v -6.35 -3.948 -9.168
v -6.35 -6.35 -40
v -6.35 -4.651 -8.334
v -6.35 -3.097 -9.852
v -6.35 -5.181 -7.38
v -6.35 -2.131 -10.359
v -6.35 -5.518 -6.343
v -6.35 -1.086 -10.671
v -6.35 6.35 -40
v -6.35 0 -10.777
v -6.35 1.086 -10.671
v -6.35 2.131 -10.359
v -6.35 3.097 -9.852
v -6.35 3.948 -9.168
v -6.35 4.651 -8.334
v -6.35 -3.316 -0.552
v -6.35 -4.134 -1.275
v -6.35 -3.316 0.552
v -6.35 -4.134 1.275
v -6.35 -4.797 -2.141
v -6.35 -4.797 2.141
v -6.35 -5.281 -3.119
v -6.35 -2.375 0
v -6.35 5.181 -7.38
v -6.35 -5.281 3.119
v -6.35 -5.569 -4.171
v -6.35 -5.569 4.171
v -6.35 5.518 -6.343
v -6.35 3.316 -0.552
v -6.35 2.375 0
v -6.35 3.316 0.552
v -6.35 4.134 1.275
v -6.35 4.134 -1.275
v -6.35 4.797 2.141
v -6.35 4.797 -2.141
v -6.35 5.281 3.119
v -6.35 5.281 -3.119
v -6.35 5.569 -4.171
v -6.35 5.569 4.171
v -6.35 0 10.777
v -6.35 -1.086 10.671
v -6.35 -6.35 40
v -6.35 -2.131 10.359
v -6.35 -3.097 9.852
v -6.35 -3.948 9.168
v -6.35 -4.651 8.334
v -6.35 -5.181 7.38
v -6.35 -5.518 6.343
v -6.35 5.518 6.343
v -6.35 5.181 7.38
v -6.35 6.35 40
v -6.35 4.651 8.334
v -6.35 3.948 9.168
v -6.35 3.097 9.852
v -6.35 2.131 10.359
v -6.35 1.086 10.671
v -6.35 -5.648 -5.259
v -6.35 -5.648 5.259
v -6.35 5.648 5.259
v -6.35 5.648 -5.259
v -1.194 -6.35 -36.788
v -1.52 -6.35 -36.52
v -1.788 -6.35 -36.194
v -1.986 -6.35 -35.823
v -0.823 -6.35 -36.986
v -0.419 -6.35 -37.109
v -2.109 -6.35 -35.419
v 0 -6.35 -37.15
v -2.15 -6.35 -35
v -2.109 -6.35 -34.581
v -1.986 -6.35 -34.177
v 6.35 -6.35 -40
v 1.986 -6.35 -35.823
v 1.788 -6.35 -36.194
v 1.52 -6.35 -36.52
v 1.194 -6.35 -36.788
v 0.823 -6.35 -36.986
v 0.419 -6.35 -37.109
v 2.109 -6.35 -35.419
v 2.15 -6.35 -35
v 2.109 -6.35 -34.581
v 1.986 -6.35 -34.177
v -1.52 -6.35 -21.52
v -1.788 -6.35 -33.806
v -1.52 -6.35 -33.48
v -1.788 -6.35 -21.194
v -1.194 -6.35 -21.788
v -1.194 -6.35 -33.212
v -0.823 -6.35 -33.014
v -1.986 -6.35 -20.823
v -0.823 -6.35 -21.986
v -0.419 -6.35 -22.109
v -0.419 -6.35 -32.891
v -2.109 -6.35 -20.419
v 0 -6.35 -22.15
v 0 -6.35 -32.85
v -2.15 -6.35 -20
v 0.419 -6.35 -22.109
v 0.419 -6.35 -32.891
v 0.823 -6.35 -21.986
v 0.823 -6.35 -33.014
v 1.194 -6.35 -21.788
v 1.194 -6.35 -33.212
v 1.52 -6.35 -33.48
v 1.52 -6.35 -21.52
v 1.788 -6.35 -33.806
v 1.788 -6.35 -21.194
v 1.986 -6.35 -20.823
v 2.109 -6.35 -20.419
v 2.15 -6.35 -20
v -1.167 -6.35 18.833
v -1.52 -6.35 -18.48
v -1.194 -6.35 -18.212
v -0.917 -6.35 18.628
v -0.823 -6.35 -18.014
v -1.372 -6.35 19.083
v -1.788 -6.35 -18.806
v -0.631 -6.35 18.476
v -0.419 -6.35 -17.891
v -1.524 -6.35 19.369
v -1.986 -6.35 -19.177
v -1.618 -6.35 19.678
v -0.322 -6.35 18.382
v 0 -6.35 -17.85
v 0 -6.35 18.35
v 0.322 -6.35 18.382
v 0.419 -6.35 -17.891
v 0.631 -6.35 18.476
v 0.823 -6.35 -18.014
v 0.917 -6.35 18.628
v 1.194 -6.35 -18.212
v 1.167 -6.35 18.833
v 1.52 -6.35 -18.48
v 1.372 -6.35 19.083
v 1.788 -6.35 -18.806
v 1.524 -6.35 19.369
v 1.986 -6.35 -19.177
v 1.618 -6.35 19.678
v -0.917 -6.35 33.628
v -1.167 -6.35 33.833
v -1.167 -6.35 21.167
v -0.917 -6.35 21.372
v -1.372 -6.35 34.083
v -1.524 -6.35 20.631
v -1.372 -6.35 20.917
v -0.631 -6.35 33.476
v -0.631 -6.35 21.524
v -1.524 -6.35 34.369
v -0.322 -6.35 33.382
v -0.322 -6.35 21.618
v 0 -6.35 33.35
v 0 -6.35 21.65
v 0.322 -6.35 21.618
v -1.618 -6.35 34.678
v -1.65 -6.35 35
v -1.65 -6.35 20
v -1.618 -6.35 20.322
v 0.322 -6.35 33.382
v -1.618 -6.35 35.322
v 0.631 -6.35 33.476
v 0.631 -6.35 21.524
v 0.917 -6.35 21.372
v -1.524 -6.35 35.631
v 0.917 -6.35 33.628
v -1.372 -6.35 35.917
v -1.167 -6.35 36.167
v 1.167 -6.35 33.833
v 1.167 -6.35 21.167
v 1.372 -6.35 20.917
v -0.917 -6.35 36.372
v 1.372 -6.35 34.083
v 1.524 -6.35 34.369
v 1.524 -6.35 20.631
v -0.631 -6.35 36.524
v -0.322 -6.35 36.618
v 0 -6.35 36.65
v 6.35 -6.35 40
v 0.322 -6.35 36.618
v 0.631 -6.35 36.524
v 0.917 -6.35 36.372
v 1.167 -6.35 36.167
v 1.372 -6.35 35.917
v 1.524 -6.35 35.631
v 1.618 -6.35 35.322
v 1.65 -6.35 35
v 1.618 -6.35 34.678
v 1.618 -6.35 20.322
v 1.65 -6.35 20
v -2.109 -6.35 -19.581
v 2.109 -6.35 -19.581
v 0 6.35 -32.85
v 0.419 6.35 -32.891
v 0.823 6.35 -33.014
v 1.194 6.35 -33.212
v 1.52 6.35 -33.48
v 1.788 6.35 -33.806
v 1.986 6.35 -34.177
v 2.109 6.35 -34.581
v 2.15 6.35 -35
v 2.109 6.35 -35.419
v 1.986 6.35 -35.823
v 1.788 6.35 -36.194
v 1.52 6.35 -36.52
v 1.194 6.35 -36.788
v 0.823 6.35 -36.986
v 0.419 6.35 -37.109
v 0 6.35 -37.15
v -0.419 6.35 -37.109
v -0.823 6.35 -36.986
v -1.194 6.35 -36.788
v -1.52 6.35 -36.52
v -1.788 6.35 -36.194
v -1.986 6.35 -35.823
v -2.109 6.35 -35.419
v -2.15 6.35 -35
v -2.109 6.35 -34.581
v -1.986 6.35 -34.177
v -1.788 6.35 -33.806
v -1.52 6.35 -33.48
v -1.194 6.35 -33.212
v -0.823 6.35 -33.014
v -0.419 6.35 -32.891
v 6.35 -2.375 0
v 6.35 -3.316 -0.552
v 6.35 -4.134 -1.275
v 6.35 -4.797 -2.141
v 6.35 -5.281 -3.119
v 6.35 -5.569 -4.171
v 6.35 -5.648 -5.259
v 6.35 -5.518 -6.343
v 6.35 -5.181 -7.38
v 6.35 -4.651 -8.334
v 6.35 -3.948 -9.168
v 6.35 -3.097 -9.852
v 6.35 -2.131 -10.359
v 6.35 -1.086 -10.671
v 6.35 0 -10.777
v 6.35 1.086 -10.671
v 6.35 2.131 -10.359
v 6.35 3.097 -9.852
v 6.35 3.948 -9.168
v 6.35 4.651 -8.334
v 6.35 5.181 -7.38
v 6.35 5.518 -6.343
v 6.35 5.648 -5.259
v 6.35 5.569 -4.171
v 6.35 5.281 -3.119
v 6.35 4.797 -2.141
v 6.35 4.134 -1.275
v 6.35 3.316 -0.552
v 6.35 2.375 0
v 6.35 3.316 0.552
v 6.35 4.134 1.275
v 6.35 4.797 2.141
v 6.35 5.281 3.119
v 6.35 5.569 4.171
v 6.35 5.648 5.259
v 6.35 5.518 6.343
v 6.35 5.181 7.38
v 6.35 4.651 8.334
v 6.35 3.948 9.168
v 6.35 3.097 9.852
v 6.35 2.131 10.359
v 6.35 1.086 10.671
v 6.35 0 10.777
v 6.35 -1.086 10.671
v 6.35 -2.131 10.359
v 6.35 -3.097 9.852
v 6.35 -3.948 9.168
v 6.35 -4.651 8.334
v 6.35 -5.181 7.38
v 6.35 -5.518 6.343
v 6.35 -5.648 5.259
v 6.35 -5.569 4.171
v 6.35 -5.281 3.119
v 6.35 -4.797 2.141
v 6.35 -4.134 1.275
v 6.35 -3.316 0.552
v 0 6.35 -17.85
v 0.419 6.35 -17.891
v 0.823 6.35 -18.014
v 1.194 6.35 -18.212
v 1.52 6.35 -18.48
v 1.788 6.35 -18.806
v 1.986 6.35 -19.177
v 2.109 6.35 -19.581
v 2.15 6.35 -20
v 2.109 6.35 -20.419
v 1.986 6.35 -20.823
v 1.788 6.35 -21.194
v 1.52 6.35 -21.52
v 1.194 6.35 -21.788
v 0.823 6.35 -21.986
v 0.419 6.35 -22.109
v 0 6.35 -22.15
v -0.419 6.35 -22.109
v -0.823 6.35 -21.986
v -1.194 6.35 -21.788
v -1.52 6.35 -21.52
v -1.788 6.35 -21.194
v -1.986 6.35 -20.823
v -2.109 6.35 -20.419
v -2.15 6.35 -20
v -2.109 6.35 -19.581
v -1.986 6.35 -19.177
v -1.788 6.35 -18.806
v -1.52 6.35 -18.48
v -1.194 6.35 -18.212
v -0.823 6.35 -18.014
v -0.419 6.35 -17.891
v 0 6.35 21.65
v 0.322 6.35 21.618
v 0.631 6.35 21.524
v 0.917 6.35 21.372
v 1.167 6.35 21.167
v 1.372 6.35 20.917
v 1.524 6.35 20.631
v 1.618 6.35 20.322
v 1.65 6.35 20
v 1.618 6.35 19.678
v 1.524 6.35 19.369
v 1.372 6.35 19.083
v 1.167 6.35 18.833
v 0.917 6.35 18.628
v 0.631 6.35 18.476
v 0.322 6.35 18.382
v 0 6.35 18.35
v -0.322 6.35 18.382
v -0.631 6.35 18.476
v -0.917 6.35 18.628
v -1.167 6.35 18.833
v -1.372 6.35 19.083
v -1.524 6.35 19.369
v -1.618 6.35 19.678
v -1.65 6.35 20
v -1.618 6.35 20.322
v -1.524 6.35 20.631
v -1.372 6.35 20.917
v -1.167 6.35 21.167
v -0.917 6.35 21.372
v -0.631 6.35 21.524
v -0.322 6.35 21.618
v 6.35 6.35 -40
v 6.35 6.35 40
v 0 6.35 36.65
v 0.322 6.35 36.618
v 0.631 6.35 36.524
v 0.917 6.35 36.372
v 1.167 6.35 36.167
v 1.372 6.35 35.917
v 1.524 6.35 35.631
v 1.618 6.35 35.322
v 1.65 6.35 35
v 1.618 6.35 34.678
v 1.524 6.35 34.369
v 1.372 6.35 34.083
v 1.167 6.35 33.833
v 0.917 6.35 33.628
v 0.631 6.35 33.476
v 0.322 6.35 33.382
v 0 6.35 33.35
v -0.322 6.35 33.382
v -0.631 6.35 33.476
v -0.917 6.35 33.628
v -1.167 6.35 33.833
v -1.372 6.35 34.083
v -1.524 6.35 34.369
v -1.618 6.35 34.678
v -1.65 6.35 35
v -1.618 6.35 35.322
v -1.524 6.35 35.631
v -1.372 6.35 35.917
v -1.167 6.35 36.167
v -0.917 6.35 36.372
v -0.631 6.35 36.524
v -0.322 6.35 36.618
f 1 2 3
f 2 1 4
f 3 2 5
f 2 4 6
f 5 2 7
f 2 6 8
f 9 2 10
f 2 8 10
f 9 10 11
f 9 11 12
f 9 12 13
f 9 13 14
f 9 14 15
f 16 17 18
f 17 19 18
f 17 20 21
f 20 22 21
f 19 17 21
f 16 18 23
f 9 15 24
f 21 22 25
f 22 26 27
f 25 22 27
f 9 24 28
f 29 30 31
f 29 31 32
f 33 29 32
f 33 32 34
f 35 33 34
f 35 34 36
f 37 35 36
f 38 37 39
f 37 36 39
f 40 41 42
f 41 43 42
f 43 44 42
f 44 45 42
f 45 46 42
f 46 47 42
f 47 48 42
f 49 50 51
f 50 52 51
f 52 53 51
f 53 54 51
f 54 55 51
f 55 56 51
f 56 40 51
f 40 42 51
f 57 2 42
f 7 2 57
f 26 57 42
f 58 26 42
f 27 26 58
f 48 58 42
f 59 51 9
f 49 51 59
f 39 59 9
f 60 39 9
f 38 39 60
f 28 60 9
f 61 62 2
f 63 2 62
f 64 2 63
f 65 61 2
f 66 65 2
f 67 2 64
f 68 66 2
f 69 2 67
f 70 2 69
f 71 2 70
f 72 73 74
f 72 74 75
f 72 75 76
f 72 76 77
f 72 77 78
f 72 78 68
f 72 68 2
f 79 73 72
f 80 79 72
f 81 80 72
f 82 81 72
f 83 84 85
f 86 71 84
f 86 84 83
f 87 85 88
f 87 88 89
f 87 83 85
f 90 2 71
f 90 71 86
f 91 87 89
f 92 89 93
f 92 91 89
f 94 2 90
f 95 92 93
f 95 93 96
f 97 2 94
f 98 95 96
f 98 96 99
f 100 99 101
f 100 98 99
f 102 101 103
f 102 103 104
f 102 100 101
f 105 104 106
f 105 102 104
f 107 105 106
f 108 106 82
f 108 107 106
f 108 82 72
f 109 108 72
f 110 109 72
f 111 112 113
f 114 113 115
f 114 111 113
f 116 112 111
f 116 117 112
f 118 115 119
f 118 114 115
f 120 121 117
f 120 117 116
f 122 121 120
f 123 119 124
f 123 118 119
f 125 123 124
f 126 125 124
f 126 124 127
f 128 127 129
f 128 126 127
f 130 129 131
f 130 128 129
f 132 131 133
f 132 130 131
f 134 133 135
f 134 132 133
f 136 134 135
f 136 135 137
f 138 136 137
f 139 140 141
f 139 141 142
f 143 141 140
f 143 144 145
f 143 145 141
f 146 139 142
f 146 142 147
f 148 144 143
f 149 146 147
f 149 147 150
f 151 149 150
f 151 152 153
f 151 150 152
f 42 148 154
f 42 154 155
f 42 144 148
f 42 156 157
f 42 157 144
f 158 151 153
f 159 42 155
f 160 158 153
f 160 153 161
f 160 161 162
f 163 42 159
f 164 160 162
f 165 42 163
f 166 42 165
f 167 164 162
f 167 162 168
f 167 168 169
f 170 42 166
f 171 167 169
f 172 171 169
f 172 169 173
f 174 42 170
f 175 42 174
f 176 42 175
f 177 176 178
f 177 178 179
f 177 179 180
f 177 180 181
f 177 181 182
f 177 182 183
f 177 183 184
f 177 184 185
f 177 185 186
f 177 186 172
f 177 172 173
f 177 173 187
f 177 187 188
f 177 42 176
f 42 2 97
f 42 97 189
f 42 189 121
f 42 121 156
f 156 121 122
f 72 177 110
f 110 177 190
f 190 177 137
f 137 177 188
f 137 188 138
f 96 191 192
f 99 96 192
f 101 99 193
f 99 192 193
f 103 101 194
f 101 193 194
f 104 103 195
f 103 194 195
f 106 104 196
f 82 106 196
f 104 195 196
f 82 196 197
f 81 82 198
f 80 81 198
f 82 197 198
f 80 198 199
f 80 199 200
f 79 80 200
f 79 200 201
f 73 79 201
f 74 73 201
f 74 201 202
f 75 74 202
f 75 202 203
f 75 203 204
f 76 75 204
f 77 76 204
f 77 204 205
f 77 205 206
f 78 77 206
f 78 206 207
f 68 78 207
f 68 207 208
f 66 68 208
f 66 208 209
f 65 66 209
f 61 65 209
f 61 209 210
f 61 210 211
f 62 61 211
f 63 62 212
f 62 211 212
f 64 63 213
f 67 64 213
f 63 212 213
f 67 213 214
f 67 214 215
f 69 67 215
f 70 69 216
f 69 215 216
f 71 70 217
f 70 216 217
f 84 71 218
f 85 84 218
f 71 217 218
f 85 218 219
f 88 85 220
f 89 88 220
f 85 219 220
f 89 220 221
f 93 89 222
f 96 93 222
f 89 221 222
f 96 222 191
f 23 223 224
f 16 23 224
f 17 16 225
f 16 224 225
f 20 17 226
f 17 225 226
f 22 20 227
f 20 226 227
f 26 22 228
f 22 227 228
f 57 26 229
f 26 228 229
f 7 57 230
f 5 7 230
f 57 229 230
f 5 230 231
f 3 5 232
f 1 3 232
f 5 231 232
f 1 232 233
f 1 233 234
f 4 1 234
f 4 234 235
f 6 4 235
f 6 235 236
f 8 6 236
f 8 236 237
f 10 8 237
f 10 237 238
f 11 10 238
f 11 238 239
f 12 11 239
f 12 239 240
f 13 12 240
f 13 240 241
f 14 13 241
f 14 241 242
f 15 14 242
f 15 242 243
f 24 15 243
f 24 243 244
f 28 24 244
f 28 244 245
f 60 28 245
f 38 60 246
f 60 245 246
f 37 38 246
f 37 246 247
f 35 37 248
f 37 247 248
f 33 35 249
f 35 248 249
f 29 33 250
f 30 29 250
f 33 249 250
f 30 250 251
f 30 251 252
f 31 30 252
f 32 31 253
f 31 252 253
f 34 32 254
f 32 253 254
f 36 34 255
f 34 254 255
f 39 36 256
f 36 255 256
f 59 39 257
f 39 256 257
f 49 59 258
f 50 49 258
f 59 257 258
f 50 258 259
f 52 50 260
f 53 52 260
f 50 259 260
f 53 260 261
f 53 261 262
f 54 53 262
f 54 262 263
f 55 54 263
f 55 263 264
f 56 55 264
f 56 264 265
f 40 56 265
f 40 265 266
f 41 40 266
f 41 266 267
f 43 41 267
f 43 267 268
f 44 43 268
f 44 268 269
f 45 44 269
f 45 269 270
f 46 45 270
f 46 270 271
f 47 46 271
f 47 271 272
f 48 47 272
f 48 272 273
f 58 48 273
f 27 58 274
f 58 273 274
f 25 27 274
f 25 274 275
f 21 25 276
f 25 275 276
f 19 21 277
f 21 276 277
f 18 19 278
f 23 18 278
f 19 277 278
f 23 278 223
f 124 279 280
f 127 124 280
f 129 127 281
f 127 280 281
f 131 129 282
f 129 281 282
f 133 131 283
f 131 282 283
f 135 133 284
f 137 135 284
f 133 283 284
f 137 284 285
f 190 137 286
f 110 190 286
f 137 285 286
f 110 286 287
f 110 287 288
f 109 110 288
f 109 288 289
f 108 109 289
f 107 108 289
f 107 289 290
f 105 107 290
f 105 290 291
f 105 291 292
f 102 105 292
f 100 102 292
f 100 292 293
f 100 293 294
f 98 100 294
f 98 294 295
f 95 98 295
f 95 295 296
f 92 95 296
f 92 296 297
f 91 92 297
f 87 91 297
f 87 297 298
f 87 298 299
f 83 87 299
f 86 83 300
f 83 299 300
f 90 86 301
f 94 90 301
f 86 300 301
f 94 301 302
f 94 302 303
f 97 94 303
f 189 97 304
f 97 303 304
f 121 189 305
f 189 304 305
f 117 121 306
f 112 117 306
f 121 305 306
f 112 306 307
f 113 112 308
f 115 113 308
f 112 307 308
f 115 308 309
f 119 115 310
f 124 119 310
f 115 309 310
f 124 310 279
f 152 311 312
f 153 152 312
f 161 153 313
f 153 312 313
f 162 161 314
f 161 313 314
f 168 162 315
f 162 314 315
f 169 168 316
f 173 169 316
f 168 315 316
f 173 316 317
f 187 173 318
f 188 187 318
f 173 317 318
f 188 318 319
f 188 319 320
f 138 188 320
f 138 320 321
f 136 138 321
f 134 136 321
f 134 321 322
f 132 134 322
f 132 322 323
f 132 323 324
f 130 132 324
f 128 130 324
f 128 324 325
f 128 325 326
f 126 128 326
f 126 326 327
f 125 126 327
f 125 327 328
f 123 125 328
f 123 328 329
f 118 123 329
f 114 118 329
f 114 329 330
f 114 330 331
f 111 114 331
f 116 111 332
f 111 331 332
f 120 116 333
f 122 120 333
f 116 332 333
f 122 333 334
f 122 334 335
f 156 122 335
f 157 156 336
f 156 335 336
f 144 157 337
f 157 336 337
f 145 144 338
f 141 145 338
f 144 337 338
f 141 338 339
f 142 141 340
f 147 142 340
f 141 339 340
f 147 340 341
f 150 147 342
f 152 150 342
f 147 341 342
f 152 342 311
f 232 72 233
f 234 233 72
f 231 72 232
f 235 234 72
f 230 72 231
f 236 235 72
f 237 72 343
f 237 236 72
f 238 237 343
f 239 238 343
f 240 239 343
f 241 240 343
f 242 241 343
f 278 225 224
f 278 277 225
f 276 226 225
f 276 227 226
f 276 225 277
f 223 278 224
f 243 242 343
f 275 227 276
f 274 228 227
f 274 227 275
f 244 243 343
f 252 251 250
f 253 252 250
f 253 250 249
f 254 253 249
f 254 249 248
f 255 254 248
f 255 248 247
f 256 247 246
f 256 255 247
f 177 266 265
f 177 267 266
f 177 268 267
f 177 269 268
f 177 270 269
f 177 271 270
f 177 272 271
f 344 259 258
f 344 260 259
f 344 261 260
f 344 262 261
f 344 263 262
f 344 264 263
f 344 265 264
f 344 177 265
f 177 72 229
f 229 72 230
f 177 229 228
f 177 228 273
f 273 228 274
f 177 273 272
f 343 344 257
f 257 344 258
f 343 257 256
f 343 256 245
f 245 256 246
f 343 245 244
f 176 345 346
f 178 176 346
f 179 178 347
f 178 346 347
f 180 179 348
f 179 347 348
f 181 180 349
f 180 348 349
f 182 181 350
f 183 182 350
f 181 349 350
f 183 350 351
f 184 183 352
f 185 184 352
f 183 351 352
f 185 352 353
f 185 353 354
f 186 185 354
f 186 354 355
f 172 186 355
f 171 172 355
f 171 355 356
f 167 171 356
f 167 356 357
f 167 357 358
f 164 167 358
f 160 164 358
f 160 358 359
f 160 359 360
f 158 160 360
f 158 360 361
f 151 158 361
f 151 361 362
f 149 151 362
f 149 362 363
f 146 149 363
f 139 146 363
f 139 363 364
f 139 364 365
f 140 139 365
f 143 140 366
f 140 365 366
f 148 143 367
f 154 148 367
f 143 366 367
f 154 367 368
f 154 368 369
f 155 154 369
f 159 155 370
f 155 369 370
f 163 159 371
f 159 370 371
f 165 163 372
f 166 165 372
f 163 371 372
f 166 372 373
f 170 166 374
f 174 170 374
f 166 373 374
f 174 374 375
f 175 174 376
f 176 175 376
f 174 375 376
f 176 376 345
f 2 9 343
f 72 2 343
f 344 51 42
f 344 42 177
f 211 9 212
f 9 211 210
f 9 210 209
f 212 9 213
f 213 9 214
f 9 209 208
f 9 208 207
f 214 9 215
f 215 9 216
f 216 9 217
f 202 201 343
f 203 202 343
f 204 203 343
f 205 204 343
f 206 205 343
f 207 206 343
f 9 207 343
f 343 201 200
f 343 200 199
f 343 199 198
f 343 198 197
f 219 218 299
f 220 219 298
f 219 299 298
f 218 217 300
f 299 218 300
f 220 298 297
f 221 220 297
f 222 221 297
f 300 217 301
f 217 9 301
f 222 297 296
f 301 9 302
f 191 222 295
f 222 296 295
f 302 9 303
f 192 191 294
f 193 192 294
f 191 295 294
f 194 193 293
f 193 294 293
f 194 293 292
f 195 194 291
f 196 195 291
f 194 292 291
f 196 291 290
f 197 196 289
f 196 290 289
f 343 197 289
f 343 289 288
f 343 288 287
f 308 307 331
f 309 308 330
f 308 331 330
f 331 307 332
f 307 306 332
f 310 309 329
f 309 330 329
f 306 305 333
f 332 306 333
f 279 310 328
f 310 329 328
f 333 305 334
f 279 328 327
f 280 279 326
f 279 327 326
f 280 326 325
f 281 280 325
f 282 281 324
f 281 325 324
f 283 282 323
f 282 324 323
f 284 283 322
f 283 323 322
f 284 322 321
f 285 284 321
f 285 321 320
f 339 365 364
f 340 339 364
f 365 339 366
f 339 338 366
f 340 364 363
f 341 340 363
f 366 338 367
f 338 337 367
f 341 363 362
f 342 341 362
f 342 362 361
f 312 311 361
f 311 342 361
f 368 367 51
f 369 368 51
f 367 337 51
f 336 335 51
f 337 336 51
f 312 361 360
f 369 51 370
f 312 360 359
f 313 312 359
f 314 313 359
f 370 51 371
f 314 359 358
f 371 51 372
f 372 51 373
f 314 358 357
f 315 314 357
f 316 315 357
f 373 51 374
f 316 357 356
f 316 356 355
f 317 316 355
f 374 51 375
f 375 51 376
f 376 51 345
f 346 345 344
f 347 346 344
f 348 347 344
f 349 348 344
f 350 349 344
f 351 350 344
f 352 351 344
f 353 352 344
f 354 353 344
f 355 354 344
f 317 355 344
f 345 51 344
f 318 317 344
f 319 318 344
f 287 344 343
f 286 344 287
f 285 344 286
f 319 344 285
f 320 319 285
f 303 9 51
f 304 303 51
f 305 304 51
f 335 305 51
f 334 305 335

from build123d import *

# Parameters (mm, degrees)
SKETCH1_W           = 12.7
SKETCH1_H           = 12.7
BOSS_EXTRUDE1_DEPTH = 40
CUT_EXTRUDE1_DEPTH  = 43.445406112
SKETCH3_R           = 2.15
CUT_EXTRUDE2_DEPTH  = 43.445406112
SKETCH4_R           = 1.65
CUT_EXTRUDE3_DEPTH  = 43.445406112


with BuildPart() as part:
    # Sketch1 → Boss-Extrude1 (new, symmetric)
    with BuildSketch(Plane.XY):
        Rectangle(SKETCH1_W, SKETCH1_H)
    extrude(amount=BOSS_EXTRUDE1_DEPTH, both=True)

    # Sketch2 → Cut-Extrude1 (cut, through all)
    with BuildSketch(Plane(origin=(6.35, 0, 0), x_dir=(0, 0, -1), z_dir=(1, 0, 0))):
        with BuildLine():
            ThreePointArc((0, 2.375), (-10.776585121, 0), (0, -2.375))
            ThreePointArc((0, -2.375), (10.776585121, 0), (0, 2.375))
        make_face()
    extrude(amount=-CUT_EXTRUDE1_DEPTH, mode=Mode.SUBTRACT)

    # Sketch3 → Cut-Extrude2 (cut, through all)
    with BuildSketch(Plane(origin=(0, 6.35, 0), x_dir=(1, 0, 0), z_dir=(0, 1, 0))):
        with Locations((0, 35)):
            Circle(SKETCH3_R)
        with Locations((0, 20)):
            Circle(SKETCH3_R)
    extrude(amount=-CUT_EXTRUDE2_DEPTH, mode=Mode.SUBTRACT)

    # Sketch4 → Cut-Extrude3 (cut, through all)
    with BuildSketch(Plane(origin=(0, 6.35, 0), x_dir=(1, 0, 0), z_dir=(0, 1, 0))):
        with Locations((0, -35)):
            Circle(SKETCH4_R)
        with Locations((0, -20)):
            Circle(SKETCH4_R)
    extrude(amount=-CUT_EXTRUDE3_DEPTH, mode=Mode.SUBTRACT)


solid = part.part
